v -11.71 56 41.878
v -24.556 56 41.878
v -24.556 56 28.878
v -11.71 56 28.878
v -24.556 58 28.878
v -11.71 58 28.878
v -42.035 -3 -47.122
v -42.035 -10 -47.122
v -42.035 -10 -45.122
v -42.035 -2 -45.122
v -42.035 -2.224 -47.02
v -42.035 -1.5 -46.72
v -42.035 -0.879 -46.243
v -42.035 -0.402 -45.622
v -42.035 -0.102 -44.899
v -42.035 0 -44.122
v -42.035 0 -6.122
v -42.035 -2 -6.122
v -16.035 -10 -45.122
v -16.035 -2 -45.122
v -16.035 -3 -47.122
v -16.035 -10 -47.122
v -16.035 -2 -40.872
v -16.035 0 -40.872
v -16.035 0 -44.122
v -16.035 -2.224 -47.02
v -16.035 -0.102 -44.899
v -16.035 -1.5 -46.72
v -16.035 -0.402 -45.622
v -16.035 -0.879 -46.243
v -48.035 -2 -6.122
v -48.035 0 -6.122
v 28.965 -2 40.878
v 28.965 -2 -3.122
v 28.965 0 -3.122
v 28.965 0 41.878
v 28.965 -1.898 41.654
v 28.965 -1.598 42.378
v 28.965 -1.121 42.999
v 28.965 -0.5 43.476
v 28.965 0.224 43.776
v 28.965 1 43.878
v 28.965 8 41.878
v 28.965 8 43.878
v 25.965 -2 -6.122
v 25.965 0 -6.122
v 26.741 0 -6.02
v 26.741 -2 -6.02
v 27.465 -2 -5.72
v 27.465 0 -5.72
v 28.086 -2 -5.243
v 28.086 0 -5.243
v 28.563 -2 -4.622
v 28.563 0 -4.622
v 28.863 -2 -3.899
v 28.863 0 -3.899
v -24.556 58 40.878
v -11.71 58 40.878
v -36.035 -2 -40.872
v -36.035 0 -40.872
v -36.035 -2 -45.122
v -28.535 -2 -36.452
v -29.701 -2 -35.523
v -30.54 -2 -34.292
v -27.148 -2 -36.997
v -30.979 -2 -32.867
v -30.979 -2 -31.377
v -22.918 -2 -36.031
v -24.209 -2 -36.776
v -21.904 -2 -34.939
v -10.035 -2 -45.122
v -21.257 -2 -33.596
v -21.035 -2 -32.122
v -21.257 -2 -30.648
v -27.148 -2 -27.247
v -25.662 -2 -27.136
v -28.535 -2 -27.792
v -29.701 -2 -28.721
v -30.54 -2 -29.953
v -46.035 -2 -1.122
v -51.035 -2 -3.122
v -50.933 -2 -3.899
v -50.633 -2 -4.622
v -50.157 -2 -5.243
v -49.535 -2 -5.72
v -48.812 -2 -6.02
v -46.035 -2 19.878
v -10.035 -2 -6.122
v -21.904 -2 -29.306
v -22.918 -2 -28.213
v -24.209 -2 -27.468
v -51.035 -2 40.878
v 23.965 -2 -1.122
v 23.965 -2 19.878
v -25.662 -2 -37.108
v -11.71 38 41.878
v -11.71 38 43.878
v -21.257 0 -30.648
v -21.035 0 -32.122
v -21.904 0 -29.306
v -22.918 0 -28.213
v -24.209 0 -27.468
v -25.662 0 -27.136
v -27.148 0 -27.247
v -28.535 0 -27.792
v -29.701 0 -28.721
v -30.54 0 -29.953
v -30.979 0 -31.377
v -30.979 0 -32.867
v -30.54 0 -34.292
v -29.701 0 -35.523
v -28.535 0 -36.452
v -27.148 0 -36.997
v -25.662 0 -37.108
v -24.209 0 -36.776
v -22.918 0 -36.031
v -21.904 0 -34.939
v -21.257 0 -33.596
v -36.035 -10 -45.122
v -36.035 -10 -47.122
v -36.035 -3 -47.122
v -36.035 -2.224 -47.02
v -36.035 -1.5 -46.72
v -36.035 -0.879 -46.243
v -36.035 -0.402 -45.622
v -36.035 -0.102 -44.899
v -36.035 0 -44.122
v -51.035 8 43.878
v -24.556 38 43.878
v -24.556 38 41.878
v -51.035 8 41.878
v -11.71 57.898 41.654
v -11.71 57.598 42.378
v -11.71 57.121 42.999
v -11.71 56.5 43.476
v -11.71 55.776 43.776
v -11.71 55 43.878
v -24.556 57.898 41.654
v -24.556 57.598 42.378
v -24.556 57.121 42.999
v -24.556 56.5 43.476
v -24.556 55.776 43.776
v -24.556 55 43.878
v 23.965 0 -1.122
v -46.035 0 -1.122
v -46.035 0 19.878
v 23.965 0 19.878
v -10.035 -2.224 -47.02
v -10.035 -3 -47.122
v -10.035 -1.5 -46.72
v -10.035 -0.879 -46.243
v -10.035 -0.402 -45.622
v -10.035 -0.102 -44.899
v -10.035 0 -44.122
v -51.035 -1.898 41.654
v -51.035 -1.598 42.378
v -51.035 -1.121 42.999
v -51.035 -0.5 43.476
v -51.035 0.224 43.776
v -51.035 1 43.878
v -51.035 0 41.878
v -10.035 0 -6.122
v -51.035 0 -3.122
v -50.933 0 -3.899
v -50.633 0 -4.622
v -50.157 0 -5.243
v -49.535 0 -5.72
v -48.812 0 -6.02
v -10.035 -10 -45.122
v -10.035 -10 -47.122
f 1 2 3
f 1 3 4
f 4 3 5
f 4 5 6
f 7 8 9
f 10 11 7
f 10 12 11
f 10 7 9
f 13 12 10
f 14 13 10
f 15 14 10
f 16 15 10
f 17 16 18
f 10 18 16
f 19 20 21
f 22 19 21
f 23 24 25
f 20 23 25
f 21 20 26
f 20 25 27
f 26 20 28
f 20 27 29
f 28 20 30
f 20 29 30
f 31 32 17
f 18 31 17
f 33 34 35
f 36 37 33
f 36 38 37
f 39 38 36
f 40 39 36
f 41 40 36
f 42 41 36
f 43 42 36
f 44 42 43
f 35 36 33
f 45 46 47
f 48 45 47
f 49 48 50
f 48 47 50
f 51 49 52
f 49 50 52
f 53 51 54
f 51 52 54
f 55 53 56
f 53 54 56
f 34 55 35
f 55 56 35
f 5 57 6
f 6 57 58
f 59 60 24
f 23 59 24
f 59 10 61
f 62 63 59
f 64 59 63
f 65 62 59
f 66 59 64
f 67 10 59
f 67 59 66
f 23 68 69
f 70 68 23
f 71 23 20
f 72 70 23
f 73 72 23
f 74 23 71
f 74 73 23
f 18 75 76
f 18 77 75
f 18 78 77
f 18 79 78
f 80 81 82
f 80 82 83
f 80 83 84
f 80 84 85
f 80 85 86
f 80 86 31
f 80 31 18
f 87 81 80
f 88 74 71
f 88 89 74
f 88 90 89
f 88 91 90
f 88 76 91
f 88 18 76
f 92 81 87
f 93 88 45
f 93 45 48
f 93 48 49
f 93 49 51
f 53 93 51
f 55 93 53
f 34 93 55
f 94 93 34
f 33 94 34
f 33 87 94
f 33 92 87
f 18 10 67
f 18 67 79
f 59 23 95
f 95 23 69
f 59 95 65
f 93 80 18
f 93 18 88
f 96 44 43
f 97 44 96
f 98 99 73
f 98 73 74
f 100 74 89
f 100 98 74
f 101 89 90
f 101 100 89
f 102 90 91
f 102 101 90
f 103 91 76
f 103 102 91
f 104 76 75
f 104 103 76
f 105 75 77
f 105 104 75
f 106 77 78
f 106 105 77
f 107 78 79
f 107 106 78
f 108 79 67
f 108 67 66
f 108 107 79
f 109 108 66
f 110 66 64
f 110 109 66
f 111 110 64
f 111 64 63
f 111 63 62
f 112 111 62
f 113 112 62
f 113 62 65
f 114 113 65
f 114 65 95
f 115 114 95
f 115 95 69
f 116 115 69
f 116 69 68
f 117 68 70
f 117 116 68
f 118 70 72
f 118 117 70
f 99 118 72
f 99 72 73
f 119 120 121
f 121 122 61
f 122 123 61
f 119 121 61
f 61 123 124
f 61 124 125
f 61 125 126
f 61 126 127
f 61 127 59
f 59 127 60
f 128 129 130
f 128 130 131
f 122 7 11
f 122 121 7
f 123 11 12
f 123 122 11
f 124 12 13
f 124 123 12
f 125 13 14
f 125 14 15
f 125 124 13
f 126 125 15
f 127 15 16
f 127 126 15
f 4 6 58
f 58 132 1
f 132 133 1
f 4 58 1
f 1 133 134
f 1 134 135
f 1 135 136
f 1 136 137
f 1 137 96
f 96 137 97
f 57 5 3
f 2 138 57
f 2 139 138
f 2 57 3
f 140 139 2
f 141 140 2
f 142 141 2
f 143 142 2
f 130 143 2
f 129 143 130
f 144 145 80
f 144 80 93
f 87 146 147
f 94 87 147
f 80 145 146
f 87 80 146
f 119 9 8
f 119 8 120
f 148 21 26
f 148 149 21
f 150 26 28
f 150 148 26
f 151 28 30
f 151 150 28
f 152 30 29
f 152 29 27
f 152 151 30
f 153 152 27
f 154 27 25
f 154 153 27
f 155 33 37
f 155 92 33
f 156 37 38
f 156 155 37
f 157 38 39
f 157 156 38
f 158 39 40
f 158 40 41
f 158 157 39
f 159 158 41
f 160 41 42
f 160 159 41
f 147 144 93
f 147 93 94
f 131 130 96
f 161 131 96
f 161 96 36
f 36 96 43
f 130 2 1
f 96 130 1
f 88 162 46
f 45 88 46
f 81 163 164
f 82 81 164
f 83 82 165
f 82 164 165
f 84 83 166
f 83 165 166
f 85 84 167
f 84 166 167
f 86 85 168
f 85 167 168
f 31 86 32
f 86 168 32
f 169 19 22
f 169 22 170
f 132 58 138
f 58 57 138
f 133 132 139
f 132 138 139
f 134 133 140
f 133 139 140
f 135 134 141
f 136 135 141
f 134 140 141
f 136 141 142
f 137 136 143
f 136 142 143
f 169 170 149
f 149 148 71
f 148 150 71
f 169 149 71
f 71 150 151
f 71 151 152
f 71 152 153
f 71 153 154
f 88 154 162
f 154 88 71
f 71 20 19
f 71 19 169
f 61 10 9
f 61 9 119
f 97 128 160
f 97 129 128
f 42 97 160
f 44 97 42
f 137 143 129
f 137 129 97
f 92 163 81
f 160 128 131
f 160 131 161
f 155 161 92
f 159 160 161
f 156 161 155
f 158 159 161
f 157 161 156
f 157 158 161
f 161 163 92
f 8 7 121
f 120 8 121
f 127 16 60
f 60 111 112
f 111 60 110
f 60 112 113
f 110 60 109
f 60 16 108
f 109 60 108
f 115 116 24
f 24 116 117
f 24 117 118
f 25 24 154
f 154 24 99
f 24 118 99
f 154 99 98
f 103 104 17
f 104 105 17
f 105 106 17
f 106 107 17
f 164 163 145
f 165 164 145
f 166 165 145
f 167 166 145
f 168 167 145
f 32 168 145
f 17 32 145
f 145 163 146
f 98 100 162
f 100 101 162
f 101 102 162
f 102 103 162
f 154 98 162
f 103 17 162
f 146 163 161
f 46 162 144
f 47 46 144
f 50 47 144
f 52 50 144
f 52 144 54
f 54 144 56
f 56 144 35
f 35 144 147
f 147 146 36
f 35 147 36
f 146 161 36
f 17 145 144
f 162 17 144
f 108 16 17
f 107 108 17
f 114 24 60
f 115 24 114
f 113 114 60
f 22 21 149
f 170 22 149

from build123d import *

# Parameters (mm, degrees)
F0_R     = 5
F0_W     = 70
F0_H     = 21
F1_DEPTH = 2
F2_W     = 6
F2_H     = 2
F3_DEPTH = 8
F4_R     = 3
F6_DEPTH = 2
F7_W     = 12.8450786794
F7_H     = 2
F8_DEPTH = 13
F9_R     = 3


with BuildPart() as f1:
    # F0 (on Front) → F1 (new body)
    with BuildSketch(Plane.XZ):
        with BuildLine():
            Line((28.9647261798, 43.8778921962), (-51.0352738202, 43.8778921962))
            Line((-51.0352738202, 43.8778921962), (-51.0352738202, -3.1221078038))
            ThreePointArc((-51.0352738202, -3.1221078038), (-50.1565941637, -5.2434281474), (-48.0352738202, -6.1221078038))
            Line((-48.0352738202, -6.1221078038), (-42.0352738202, -6.1221078038))
            Line((-42.0352738202, -6.1221078038), (-42.0352738202, -47.1221078038))
            Line((-42.0352738202, -47.1221078038), (-36.0352738202, -47.1221078038))
            Line((-36.0352738202, -47.1221078038), (-36.0352738202, -40.8721078038))
            Line((-36.0352738202, -40.8721078038), (-16.0352738202, -40.8721078038))
            Line((-16.0352738202, -40.8721078038), (-16.0352738202, -47.1221078038))
            Line((-16.0352738202, -47.1221078038), (-10.0352738202, -47.1221078038))
            Line((-10.0352738202, -47.1221078038), (-10.0352738202, -6.1221078038))
            Line((-10.0352738202, -6.1221078038), (25.9647261798, -6.1221078038))
            ThreePointArc((25.9647261798, -6.1221078038), (28.0860465234, -5.2434281474), (28.9647261798, -3.1221078038))
            Line((28.9647261798, -3.1221078038), (28.9647261798, 43.8778921962))
        make_face()
        with Locations((-26.0352738202, -32.1221078038)):
            Circle(F0_R, mode=Mode.SUBTRACT)
        with Locations((-11.0352738202, 9.3778921962)):
            Rectangle(F0_W, F0_H, mode=Mode.SUBTRACT)
    extrude(amount=F1_DEPTH)

    # F2 (on face) → F3 (join)
    with BuildSketch(Plane.XZ.offset(2)):
        with Locations((-39.0352738202, -46.1221078038)):
            Rectangle(F2_W, F2_H)
        with Locations((-13.0352738202, -46.1221078038)):
            Rectangle(F2_W, F2_H)
    extrude(amount=F3_DEPTH)

    # F4
    f4_edges = [f1.edges().sort_by_distance(p)[0] for p in [
        (-13.035274, 0, -47.122108),
        (-39.035274, 0, -47.122108),
    ]]
    fillet(f4_edges, radius=F4_R)

    # F5 (on face) → F6 (join)
    with BuildSketch(Plane.XY.offset(43.8778921962)):
        Polygon((-51.0352738202, 8), (-51.0352738202, 0), (28.9647261798, 0), (28.9647261798, 8), (-11.7104330932, 38), (-11.7104330932, 58), (-24.5555117726, 58), (-24.5555117726, 38), align=None)
    extrude(amount=-F6_DEPTH)

    # F7 (on face) → F8 (join)
    with BuildSketch(Plane(origin=(0, 0, 41.8778921962), x_dir=(1, 0, 0), z_dir=(0, 0, -1))):
        with Locations((-18.1329724329, -57)):
            Rectangle(F7_W, F7_H)
    extrude(amount=F8_DEPTH)

    # F9
    f9_edges = [f1.edges().sort_by_distance(p)[0] for p in [
        (-18.132972, 58, 43.877892),
        (-11.035274, -2, 43.877892),
    ]]
    fillet(f9_edges, radius=F9_R)


solid = f1.part
